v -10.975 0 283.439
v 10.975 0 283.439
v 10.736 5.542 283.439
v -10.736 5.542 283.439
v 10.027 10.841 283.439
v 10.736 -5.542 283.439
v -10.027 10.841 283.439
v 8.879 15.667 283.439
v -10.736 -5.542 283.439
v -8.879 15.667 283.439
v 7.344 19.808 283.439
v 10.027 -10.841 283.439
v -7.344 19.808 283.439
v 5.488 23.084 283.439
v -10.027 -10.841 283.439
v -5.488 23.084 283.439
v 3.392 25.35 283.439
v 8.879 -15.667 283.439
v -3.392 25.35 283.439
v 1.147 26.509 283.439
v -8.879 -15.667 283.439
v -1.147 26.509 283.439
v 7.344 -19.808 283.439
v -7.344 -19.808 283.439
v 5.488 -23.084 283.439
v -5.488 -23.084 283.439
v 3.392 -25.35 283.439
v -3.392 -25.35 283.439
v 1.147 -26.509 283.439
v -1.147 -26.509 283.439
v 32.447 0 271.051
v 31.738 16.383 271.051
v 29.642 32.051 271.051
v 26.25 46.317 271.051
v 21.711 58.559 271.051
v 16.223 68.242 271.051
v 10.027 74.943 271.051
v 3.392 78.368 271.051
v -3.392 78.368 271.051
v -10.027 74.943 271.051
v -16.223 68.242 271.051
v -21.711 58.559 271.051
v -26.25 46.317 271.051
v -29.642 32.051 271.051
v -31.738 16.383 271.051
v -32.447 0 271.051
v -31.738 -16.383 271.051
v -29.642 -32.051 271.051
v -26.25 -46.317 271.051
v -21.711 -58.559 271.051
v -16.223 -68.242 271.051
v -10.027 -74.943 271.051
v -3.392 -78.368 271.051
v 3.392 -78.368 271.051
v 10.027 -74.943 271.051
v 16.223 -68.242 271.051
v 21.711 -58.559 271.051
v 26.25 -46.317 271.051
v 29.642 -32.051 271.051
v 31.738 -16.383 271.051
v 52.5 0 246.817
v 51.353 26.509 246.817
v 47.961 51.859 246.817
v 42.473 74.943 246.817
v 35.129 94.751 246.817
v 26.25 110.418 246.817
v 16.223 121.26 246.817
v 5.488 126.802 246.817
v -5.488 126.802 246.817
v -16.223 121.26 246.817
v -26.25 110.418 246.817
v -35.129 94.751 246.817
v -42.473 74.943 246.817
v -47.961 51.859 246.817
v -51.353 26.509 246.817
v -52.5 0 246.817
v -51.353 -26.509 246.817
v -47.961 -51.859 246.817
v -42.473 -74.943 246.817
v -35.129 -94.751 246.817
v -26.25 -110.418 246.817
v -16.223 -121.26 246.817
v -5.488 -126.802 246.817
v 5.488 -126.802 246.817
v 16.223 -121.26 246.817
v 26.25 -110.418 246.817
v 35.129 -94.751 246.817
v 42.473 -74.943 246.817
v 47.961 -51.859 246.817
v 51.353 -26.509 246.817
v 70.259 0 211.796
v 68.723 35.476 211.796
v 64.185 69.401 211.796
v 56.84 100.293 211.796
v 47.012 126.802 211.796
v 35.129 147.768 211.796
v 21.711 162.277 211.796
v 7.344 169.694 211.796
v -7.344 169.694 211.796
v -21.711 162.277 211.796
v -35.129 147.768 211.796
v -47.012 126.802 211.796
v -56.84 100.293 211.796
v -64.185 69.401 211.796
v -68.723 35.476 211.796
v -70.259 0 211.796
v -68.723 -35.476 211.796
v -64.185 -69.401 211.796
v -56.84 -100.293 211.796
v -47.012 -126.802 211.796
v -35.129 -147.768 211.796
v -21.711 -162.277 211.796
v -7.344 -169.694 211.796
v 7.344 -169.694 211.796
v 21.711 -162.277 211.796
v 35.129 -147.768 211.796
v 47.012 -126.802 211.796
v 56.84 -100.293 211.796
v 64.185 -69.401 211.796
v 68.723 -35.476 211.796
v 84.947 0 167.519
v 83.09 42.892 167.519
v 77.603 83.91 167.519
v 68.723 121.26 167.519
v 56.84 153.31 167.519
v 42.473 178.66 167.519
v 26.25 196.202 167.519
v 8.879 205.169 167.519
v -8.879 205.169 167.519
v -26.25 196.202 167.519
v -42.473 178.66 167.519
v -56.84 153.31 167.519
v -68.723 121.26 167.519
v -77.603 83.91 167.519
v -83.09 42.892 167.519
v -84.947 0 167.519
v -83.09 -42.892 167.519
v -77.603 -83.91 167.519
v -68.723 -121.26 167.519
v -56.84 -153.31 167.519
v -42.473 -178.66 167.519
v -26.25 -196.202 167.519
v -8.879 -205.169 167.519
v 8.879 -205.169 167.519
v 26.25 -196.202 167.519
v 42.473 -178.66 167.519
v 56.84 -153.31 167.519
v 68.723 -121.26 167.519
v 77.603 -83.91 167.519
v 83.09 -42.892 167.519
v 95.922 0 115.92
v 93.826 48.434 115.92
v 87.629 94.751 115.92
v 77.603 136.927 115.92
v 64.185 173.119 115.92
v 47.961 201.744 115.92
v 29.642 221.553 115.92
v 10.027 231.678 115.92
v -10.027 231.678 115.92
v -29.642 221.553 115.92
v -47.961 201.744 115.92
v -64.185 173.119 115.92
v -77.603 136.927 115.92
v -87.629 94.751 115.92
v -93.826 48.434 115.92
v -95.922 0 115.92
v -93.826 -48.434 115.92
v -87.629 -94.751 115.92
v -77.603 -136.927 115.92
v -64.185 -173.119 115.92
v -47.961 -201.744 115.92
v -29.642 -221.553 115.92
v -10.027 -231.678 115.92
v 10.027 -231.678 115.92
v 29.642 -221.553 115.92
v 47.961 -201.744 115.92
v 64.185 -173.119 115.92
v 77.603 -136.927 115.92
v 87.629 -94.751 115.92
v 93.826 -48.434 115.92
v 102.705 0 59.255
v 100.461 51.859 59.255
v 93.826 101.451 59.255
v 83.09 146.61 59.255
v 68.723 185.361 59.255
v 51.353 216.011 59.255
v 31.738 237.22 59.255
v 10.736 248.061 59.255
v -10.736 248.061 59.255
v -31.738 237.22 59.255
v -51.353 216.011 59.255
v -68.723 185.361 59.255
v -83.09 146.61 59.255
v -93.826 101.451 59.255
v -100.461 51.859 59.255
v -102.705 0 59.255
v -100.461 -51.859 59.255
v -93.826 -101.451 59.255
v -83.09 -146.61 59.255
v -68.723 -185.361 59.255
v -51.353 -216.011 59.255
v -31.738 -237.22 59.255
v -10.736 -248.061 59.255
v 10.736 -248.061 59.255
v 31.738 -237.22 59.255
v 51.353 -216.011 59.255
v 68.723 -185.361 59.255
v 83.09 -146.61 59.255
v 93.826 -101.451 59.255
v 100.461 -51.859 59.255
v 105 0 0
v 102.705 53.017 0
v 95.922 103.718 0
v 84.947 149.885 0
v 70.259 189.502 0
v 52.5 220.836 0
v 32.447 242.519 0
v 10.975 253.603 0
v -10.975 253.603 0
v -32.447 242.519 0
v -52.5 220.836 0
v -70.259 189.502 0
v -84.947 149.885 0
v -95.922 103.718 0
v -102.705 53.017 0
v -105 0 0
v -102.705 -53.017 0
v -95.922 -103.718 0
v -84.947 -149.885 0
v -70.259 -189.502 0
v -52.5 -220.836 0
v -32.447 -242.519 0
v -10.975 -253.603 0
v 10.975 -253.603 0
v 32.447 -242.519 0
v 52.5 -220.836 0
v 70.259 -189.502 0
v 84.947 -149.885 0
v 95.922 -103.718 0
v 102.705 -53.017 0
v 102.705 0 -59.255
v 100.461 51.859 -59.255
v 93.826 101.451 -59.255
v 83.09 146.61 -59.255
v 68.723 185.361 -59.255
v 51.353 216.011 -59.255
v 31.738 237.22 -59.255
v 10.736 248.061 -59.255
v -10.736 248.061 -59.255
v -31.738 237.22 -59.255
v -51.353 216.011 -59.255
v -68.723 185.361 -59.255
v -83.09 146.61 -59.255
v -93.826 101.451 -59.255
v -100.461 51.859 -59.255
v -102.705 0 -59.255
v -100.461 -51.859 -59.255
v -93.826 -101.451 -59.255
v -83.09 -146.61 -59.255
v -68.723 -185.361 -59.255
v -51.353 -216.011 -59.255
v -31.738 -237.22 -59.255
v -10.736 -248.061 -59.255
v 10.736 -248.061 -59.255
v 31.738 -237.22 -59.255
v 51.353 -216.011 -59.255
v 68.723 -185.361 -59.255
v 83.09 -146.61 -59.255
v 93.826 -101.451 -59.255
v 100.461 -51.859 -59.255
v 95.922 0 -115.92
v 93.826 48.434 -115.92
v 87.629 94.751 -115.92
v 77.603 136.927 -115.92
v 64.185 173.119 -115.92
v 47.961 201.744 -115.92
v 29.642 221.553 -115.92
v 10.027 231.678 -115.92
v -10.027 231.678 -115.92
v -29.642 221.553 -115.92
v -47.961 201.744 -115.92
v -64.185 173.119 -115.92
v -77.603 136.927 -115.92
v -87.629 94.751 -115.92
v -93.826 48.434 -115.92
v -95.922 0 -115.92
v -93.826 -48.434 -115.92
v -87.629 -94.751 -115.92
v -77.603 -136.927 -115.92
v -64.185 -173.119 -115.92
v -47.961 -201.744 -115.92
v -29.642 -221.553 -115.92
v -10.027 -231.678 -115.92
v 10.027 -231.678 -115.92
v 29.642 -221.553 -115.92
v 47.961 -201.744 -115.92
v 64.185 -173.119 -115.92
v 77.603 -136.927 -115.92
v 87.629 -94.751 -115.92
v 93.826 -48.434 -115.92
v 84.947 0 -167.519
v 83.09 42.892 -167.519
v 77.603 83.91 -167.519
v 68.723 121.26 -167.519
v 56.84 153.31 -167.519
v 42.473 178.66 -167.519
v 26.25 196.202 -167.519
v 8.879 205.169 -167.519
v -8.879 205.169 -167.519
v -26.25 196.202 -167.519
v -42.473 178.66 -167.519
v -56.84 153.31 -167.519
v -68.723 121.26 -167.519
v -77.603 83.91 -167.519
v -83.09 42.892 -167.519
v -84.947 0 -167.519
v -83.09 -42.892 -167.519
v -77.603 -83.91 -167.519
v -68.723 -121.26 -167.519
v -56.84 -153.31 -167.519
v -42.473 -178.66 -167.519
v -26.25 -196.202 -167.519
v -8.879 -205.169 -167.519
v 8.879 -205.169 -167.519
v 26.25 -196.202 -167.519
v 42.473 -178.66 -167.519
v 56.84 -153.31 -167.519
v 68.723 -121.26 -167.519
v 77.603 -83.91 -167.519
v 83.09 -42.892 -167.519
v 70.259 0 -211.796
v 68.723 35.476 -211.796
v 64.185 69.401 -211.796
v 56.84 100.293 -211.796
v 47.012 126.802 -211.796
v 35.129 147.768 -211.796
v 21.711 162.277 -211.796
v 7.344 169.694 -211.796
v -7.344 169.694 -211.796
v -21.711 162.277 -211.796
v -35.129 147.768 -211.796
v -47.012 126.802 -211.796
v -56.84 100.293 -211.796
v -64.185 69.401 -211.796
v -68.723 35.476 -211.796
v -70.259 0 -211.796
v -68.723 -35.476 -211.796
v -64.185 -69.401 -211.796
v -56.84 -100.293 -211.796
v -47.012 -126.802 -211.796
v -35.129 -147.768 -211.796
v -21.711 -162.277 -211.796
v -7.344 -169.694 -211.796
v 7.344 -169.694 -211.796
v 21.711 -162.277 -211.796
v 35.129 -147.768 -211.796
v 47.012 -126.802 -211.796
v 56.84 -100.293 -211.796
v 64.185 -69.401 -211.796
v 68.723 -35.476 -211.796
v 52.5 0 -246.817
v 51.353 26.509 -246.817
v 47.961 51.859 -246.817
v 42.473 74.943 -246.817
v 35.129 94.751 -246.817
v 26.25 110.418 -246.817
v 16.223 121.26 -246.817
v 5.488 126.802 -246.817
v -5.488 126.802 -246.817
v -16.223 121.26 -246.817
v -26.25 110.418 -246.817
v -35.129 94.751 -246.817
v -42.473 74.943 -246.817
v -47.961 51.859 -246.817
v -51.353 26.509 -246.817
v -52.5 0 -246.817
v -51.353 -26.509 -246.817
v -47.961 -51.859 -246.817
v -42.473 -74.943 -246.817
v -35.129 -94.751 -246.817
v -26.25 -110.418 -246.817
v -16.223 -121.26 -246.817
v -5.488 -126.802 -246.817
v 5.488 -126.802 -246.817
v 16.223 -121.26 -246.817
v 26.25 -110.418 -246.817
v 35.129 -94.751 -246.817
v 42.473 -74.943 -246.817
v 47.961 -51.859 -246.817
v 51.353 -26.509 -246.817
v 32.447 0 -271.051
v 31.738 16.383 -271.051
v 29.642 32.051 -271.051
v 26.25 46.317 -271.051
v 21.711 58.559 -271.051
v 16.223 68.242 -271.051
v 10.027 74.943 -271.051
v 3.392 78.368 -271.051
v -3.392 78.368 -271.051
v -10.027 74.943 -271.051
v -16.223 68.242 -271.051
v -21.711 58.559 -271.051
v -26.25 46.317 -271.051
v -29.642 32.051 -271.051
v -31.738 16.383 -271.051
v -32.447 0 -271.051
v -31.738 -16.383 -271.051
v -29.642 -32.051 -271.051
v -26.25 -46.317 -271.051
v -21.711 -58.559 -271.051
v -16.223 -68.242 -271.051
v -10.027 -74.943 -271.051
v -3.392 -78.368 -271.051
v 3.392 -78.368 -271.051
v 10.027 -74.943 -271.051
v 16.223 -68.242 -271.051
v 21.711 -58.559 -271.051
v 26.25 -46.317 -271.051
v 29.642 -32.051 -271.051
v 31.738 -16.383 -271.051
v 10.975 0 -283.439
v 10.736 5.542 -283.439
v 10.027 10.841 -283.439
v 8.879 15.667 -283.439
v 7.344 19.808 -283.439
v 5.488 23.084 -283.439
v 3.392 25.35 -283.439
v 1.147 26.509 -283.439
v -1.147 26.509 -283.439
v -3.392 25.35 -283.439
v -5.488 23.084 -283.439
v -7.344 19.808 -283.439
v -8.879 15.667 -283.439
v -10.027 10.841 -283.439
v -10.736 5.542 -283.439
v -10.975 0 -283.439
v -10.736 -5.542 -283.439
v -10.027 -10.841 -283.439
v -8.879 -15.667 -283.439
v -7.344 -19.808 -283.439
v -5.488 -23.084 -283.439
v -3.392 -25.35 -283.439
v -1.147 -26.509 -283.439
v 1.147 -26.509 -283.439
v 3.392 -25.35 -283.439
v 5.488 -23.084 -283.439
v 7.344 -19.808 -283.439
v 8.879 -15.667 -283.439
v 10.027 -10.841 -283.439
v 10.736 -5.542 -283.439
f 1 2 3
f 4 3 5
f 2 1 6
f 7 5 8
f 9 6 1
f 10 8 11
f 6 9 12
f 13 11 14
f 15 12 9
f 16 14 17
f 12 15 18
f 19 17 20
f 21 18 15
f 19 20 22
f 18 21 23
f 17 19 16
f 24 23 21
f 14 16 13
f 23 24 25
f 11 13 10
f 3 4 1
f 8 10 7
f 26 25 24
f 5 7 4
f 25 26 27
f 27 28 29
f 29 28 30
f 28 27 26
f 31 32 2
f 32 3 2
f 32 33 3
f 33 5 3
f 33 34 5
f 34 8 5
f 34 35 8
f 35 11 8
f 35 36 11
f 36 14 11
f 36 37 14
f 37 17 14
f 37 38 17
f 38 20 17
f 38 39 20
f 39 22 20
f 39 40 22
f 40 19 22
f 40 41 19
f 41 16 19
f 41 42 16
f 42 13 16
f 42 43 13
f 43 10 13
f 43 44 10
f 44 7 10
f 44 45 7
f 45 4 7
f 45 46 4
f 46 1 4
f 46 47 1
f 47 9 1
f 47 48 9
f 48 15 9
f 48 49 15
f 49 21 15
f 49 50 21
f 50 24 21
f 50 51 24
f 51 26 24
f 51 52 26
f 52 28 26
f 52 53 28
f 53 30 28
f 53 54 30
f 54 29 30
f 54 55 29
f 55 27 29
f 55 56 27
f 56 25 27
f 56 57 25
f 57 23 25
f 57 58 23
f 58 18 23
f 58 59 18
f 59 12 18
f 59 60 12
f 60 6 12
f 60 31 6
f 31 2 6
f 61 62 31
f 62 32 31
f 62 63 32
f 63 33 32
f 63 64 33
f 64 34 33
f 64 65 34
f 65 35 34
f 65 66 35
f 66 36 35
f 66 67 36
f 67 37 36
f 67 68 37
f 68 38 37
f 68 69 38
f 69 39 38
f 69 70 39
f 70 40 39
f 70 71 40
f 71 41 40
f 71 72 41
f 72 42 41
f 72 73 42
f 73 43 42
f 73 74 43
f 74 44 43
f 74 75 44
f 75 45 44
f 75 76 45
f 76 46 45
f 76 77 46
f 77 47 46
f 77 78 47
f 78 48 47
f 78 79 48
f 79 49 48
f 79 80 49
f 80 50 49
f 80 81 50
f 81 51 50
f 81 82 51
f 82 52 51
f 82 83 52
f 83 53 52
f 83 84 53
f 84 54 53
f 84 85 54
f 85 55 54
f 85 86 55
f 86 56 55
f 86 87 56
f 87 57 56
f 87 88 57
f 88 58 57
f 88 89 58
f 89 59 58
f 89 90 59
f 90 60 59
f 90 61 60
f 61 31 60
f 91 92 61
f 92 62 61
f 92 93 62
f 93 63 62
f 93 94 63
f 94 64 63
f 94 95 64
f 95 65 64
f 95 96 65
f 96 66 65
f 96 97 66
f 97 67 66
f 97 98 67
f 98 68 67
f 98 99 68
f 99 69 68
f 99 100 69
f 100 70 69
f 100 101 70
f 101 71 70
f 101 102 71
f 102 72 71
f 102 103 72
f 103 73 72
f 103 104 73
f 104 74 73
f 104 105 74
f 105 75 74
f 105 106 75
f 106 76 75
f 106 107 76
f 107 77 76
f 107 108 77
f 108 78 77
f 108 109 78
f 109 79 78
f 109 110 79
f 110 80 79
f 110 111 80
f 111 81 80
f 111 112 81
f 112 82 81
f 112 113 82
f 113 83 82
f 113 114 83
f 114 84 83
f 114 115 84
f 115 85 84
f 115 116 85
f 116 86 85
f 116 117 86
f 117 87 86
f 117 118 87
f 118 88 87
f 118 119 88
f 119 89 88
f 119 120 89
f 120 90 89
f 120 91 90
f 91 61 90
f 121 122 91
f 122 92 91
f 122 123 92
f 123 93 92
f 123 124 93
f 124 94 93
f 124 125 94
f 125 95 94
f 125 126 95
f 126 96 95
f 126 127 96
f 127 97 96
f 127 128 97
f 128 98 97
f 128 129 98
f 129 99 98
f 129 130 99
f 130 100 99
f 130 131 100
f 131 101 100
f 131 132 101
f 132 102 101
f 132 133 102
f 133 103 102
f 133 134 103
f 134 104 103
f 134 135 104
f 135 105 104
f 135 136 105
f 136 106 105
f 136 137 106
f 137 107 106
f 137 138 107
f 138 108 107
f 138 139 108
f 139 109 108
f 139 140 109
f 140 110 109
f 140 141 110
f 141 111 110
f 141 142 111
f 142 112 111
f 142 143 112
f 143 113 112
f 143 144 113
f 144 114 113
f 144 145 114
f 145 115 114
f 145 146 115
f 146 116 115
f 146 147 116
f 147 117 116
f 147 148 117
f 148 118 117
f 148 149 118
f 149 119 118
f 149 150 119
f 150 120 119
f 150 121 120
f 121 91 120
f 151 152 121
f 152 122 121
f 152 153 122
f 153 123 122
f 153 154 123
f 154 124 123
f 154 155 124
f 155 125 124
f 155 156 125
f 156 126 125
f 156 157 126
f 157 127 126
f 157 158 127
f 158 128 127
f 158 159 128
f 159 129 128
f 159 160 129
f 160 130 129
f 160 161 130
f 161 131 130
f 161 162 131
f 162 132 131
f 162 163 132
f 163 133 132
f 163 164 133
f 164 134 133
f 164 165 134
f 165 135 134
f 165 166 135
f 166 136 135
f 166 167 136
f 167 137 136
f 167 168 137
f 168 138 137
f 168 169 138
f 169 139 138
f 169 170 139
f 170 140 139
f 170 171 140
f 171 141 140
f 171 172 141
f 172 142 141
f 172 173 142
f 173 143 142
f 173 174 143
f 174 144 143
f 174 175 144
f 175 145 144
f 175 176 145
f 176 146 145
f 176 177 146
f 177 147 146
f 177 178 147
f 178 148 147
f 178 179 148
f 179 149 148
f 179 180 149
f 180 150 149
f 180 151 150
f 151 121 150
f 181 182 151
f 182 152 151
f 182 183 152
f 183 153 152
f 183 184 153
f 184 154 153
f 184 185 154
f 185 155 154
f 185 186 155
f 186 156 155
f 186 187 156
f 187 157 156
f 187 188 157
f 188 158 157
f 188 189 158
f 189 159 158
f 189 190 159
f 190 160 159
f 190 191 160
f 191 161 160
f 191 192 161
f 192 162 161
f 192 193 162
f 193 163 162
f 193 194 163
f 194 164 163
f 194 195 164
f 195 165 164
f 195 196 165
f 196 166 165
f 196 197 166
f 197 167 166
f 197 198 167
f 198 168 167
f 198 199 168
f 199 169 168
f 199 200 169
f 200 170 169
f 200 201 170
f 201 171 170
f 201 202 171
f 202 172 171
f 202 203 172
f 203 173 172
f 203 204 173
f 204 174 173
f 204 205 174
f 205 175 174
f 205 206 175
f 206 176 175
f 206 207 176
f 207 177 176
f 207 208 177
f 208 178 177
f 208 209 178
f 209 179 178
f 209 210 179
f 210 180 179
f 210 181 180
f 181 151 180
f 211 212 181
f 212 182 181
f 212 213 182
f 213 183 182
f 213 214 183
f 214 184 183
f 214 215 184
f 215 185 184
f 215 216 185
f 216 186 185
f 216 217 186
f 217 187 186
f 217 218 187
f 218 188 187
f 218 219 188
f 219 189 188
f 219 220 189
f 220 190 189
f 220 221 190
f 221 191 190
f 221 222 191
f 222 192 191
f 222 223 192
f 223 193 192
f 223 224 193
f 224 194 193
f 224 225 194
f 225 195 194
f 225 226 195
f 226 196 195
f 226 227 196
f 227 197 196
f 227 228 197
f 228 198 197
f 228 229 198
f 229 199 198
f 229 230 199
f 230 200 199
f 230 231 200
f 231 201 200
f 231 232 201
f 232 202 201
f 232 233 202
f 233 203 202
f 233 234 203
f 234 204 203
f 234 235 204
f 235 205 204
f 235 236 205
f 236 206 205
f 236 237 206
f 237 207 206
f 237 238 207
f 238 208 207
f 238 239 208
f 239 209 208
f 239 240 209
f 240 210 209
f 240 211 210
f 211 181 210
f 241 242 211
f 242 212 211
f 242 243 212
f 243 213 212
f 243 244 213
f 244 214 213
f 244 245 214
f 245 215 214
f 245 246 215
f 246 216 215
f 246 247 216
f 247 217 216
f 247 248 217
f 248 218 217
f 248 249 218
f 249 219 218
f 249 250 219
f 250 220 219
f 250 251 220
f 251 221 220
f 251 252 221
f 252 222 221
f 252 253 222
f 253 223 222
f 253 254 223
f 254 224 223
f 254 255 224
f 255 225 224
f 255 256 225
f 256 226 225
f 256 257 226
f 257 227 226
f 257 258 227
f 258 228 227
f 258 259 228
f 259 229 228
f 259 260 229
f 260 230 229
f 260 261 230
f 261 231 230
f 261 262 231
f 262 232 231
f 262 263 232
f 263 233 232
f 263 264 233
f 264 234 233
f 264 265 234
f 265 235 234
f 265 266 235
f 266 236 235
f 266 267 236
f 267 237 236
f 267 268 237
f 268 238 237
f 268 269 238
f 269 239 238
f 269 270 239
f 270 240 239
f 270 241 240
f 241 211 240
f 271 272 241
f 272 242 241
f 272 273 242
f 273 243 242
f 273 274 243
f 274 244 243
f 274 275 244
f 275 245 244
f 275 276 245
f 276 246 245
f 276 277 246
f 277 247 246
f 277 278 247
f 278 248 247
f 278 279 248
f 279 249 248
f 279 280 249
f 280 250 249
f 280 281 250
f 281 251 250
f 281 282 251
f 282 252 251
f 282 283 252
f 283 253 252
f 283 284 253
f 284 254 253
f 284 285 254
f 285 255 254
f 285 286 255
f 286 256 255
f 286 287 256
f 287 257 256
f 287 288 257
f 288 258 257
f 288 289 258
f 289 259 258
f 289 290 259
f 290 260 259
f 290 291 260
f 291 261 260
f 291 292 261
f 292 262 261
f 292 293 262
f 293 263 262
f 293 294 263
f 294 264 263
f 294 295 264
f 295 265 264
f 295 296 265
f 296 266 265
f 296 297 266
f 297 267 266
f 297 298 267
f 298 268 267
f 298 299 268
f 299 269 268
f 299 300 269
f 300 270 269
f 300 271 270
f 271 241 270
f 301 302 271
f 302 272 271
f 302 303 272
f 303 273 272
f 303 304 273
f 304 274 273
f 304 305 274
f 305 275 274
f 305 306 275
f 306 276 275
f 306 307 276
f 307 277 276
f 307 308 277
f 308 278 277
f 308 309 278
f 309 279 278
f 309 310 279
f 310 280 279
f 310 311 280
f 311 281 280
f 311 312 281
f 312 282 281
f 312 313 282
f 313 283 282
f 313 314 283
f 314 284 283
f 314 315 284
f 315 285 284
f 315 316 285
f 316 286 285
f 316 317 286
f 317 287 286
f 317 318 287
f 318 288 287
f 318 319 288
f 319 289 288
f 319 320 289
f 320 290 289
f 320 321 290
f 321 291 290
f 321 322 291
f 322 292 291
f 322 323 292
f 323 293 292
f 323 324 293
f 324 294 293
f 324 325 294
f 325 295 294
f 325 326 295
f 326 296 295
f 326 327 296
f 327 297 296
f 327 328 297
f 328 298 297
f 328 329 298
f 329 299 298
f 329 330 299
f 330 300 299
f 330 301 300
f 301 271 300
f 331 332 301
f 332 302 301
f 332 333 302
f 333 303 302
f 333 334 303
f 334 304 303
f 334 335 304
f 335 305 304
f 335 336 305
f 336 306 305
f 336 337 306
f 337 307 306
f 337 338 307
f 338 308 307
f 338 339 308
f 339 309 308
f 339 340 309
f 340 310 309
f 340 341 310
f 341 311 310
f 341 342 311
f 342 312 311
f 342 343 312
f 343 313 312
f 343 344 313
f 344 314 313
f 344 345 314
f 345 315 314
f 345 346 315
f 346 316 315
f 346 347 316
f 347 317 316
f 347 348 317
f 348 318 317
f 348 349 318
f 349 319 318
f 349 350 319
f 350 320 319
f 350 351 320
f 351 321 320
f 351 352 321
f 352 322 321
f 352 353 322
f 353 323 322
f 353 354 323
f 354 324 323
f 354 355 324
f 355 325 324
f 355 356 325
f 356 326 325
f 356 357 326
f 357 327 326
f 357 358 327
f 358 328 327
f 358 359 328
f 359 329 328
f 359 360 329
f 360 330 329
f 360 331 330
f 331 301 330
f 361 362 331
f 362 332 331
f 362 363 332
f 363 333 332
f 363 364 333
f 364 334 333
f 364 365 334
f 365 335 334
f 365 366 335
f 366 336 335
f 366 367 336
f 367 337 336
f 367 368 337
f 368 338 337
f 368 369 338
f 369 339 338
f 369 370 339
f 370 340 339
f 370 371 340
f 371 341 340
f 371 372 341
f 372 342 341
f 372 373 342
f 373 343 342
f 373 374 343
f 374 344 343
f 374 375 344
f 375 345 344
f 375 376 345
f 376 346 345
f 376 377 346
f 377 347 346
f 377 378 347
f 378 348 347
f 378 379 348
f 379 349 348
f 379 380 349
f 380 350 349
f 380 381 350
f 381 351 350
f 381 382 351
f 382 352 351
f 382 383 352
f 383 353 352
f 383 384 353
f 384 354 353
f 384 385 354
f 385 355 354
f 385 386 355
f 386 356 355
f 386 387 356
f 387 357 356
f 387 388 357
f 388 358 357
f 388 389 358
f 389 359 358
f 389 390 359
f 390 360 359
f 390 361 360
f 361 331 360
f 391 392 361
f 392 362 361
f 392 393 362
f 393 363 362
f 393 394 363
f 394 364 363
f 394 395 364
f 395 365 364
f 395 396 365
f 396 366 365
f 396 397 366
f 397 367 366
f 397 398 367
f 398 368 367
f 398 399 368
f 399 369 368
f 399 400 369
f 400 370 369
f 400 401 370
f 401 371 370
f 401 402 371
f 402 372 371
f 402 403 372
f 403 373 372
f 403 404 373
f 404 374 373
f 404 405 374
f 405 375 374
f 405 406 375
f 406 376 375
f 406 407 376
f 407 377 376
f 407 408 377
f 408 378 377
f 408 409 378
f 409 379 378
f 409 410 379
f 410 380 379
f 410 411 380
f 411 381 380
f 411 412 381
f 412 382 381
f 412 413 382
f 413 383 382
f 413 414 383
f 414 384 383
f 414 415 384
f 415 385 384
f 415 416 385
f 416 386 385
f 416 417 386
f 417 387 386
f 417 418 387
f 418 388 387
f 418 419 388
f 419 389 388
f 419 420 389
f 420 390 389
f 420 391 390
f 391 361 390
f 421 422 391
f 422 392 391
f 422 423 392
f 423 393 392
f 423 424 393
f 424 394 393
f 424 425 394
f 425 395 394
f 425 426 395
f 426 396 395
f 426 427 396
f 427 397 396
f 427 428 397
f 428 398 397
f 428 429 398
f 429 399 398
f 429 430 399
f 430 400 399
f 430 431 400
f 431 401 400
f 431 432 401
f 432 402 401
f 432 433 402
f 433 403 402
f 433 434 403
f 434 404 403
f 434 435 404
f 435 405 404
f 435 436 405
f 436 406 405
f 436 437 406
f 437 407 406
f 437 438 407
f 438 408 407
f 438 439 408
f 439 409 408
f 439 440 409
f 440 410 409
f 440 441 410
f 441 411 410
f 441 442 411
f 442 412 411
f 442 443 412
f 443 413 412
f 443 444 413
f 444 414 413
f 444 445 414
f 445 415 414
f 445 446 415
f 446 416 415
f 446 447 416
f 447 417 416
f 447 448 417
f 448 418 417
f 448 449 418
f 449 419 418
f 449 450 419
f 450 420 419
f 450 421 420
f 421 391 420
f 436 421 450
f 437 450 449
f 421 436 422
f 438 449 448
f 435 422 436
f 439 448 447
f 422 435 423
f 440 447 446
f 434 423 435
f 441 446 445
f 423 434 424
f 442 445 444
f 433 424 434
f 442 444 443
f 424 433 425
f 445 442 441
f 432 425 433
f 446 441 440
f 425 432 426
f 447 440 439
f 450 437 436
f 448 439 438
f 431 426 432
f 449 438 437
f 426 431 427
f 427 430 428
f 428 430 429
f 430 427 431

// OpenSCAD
// Generated by SolidPython 1.0.1 on 2020-07-29 00:46:48


scale(v = [7, 17, 19]) {
	sphere(r = 15);
}
/***********************************************
*********      SolidPython code:      **********
************************************************
 
# import packages: SolidPython
from solid import *
from solid.utils import *
from itertools import chain, combinations, permutations


class Resize:

    def __init__(self, scad_file):
        self.scad_file = scad_file
        #self.scad_file = import_scad(scad_file)
        # cone/cylinder param:
        self.r1 = 0
        self.r2 = 0
        self.h = 0
        # rectangular prism param:
        self.w = 0
        self.l = 0
        # ellipse param:
        self.r = 0

    # import OpenScad code (file name corresponds to shape)


    # classify shape + parameters
    def assign(self, param1, param2, param3):
        if self.scad_file == 'cone.scad':
            self.r1 = param1
            self.r2 = param2
            self.h = param3
        elif self.scad_file == 'cylinder.scad':
            self.r1 = param1
            self.r2 = param2
            self.h = param3
        elif self.scad_file == 'rectangularPrism.scad':
            self.h = param1
            self.l = param2
            self.w = param3
        else:
            self.r = param1
            self.h = param2

    # resize parameters
    def iterate(self):
        x = range(3, 20, 2)
        i = 1
        if self.scad_file == 'cone.scad':
            tempList = list(permutations(x, 2))
            for temp in tempList:
                param1 = temp[0]
                param2 = temp[1]
                filepath = 'produced_scad_files/' + 'cone' + str(param1) + '_' + str(param2) + '_' + '.scad'
                scad_render_to_file(cylinder(h=param1, r1=param2, r2=0), filepath)

        elif self.scad_file == 'cylinder.scad':
            tempList = list(permutations(x, 3))
            for temp in tempList:
                param1 = temp[0]
                param2 = temp[1]
                filepath = 'produced_scad_files/' + 'cylinder' + str(param1) + '_' + str(param2) + '_' + '.scad'
                scad_render_to_file(cylinder(h=param1, r1=param2, r2=param2), filepath)

        elif self.scad_file == 'rectangularPrism.scad':
            tempList = list(permutations(x, 3))
            for temp in tempList:
                param1 = temp[0]
                param2 = temp[1]
                param3 = temp[2]
                filepath = 'produced_scad_files/' + 'rectangularPrism' + str(param1) + '_' + str(param2) + '_' + str(
                    param3) + '.scad'
                scad_render_to_file(cube(size=(param1, param2, param3)), filepath)

        elif self.scad_file == 'ellipse.scad':
            tempList = list(permutations(x, 4))
            for temp in tempList:
                param1 = temp[0]
                param2 = temp[1]
                param3 = temp[2]
                param4 = temp[3]
                filepath = 'produced_scad_files/' + 'ellipse' + str(param1) + '_' + str(param2) + '_' + str(param3) + '_' + str(param4) + '.scad'
                scad_render_to_file(scale([param1, param2, param3])(sphere(r=param4)), filepath)

    def render_to_scadfile(self):
        scad_render_to_file(scad, 'example.scad') 
 
************************************************/
